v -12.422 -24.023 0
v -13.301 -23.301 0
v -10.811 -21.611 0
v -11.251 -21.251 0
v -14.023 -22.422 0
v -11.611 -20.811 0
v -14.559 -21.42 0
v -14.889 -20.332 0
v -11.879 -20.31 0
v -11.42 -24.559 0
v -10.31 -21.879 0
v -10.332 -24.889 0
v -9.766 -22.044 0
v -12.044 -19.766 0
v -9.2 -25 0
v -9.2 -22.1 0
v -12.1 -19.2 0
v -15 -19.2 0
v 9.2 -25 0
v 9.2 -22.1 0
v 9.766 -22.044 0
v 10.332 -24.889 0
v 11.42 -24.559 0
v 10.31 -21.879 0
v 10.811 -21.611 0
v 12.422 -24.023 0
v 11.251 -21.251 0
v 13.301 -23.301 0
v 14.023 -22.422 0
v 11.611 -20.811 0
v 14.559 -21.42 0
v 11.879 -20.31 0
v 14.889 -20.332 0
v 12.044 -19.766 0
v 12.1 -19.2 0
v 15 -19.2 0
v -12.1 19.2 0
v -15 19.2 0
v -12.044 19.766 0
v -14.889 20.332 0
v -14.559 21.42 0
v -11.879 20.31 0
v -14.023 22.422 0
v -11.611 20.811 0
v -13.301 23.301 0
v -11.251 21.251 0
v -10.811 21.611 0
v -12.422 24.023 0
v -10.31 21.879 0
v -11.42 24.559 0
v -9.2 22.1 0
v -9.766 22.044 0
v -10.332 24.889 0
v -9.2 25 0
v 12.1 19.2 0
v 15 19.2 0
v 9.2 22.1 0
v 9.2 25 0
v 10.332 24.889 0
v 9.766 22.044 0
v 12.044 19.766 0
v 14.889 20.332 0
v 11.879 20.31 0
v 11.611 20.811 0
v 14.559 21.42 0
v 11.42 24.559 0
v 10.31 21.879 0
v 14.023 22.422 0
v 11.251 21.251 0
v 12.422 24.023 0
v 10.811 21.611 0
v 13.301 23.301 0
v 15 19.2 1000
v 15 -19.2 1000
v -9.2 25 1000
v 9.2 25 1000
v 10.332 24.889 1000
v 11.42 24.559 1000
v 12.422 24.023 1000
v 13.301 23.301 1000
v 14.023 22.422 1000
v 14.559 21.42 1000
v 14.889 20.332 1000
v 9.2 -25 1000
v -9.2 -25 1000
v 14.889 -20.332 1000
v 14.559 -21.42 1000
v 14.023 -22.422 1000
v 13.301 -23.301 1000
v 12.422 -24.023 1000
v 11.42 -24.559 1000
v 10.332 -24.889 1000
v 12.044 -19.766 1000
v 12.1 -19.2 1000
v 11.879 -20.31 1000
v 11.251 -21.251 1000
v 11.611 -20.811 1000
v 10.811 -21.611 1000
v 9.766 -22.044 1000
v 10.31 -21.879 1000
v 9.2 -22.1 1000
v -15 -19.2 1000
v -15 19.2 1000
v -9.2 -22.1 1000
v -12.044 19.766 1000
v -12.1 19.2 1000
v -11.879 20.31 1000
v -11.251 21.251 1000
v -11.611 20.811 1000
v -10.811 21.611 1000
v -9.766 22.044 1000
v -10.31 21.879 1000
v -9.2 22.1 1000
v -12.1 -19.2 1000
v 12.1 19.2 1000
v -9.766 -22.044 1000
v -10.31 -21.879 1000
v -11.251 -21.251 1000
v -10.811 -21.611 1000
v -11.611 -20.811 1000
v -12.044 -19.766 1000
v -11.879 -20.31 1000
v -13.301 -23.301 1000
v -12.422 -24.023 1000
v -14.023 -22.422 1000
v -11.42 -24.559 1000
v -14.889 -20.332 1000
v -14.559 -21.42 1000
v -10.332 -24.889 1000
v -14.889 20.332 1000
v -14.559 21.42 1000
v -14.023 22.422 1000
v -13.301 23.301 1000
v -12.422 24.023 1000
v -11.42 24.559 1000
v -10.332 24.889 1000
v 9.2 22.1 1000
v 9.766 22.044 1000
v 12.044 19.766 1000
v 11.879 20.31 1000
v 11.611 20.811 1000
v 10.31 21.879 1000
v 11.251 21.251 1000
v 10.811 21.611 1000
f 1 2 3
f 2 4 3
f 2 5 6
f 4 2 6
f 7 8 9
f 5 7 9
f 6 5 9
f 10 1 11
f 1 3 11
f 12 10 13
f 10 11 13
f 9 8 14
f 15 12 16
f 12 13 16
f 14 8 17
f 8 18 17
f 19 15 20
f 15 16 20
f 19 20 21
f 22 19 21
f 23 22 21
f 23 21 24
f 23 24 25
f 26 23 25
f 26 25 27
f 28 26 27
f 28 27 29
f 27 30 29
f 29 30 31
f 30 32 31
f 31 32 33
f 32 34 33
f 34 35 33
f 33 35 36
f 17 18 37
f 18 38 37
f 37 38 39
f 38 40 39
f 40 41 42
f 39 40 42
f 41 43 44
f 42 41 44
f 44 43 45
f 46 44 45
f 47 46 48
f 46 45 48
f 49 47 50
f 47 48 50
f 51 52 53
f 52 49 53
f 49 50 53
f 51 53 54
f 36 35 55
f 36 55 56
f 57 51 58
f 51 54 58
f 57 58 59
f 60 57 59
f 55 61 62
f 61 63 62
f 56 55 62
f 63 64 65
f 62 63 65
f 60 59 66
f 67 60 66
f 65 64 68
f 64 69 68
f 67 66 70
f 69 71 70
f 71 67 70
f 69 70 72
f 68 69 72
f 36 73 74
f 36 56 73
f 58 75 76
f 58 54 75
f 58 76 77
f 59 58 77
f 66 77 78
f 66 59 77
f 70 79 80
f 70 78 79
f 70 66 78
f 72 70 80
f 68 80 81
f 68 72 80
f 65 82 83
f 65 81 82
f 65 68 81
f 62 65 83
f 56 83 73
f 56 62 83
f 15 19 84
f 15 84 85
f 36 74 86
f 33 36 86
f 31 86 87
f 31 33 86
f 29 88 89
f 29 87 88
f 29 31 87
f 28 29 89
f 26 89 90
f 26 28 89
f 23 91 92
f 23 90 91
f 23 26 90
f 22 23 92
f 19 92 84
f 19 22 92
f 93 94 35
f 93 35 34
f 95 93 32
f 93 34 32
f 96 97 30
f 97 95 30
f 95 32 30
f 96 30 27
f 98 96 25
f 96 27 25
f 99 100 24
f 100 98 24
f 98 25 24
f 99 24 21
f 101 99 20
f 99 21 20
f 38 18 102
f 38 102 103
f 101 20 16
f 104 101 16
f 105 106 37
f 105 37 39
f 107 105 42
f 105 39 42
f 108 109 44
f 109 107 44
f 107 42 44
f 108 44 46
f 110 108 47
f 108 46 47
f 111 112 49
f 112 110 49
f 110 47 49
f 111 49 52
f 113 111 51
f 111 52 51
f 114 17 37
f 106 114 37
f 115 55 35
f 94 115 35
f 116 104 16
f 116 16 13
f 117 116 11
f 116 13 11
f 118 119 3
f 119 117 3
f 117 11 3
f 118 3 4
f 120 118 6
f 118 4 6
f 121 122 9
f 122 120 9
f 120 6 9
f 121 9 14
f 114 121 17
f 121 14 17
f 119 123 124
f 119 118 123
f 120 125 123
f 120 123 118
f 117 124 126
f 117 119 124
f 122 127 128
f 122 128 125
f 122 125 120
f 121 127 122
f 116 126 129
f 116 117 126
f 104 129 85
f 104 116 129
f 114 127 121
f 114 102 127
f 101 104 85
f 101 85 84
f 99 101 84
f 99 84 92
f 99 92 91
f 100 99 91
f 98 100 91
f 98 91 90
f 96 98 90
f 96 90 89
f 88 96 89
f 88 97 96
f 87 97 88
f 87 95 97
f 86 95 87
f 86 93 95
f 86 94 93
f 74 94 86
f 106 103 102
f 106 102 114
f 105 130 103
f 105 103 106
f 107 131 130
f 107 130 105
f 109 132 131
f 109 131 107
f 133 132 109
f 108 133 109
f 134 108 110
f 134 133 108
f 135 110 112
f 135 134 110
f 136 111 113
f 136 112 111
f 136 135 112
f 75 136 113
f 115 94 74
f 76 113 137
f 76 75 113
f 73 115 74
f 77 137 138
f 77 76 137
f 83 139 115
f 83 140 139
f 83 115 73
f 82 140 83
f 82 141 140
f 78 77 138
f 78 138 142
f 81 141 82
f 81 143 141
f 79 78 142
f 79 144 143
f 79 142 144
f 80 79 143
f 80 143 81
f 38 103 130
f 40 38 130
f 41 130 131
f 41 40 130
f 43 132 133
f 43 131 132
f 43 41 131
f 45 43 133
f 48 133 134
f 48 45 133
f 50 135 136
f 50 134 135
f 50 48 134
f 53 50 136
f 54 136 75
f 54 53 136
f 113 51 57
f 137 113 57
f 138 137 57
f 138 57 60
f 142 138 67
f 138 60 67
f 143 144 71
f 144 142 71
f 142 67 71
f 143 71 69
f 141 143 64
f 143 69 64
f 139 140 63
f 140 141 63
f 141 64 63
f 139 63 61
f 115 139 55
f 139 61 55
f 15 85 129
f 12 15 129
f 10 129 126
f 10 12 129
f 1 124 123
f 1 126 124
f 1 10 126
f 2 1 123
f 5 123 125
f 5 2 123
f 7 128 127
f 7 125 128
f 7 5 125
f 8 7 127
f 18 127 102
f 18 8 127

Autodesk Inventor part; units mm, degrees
ref_plane "YZ Plane" through (0, 0, 0) normal (1, 0, 0) x (0, 1, 0)
ref_plane "Plano inicial" through (0, 0, 0) normal (0, 0, 1) x (1, 0, 0)
ref_plane "Plano final" through (0, 0, 1000) normal (0, 0, 1) x (1, 0, 0)
sketch "Boceto" plane through (0, 0, 0) normal (0, 0, 1) x (1, 0, 0)
  line L0 (-9.2, 25) -> (9.2, 25)
  line L1 (15, 19.2) -> (15, -19.2)
  line L2 (9.2, -25) -> (-9.2, -25)
  line L3 (-15, -19.2) -> (-15, 19.2)
  arc A0 (-9.2, 25) -> (-15, 19.2) centre (-9.2, 19.2) ccw
  arc A1 (15, 19.2) -> (9.2, 25) centre (9.2, 19.2) ccw
  arc A2 (9.2, -25) -> (15, -19.2) centre (9.2, -19.2) ccw
  arc A3 (-15, -19.2) -> (-9.2, -25) centre (-9.2, -19.2) ccw
  line L4 (-22.6817, 0) -> (22.6817, 0) construction
  line L5 (0, -36.6817) -> (0, 36.6817) construction
  arc A4 (-9.2, 22.1) -> (-12.1, 19.2) centre (-9.2, 19.2) ccw
  line L6 (-9.2, 22.1) -> (9.2, 22.1)
  arc A5 (12.1, 19.2) -> (9.2, 22.1) centre (9.2, 19.2) ccw
  line L7 (12.1, 19.2) -> (12.1, -19.2)
  arc A6 (9.2, -22.1) -> (12.1, -19.2) centre (9.2, -19.2) ccw
  line L8 (9.2, -22.1) -> (-9.2, -22.1)
  arc A7 (-12.1, -19.2) -> (-9.2, -22.1) centre (-9.2, -19.2) ccw
  line L9 (-12.1, -19.2) -> (-12.1, 19.2)
  point P0 (-15, 25)
  point P1 (15, -25)
  point P2 (15, 25)
  dimension "b" = 30
  dimension "ParH" = 50
  dimension "msp_r" = 5.8
  dimension "d8" = 15
  dimension "d9" = 25
  dimension "d10" = 2.9
extrude "Cuerpo" add sketch "Boceto" along normal up to surface (1000 mm away) from surface at 0
sketch "Sketch2" plane through (0, 0, 0) normal (0, 0, 1) x (1, 0, 0)
  line L0 (0, 0) -> (10, 0)
ref_plane "Work Plane3" through (0, 0, 0) normal (0, -1, 0) x (1, 0, 0)
sketch "Sketch3" plane through (0, 0, 0) normal (0, -1, 0) x (1, 0, 0)
  line L0 (-2, 0) -> (12, 0)
  line L1 (-2, 1000) -> (12, 1000)
  dimension "d14" = 1000
equation "\"msp_r\" = 2 * ParT"
equation "\"d8\" = 0.5 * b"
equation "\"d9\" = 0.5 * ParH"
equation "\"d10\" = ParT"
equation "\"G_OFFSET_START\" = 0"
equation "\"G_OFFSET_END\" = 0"
equation "\"G_L\" = d14"
equation "\"ParT\" = 2.9"
properties part number "DIN 59 410 - 50x30x2.9-1000" material "Acero, suave"
